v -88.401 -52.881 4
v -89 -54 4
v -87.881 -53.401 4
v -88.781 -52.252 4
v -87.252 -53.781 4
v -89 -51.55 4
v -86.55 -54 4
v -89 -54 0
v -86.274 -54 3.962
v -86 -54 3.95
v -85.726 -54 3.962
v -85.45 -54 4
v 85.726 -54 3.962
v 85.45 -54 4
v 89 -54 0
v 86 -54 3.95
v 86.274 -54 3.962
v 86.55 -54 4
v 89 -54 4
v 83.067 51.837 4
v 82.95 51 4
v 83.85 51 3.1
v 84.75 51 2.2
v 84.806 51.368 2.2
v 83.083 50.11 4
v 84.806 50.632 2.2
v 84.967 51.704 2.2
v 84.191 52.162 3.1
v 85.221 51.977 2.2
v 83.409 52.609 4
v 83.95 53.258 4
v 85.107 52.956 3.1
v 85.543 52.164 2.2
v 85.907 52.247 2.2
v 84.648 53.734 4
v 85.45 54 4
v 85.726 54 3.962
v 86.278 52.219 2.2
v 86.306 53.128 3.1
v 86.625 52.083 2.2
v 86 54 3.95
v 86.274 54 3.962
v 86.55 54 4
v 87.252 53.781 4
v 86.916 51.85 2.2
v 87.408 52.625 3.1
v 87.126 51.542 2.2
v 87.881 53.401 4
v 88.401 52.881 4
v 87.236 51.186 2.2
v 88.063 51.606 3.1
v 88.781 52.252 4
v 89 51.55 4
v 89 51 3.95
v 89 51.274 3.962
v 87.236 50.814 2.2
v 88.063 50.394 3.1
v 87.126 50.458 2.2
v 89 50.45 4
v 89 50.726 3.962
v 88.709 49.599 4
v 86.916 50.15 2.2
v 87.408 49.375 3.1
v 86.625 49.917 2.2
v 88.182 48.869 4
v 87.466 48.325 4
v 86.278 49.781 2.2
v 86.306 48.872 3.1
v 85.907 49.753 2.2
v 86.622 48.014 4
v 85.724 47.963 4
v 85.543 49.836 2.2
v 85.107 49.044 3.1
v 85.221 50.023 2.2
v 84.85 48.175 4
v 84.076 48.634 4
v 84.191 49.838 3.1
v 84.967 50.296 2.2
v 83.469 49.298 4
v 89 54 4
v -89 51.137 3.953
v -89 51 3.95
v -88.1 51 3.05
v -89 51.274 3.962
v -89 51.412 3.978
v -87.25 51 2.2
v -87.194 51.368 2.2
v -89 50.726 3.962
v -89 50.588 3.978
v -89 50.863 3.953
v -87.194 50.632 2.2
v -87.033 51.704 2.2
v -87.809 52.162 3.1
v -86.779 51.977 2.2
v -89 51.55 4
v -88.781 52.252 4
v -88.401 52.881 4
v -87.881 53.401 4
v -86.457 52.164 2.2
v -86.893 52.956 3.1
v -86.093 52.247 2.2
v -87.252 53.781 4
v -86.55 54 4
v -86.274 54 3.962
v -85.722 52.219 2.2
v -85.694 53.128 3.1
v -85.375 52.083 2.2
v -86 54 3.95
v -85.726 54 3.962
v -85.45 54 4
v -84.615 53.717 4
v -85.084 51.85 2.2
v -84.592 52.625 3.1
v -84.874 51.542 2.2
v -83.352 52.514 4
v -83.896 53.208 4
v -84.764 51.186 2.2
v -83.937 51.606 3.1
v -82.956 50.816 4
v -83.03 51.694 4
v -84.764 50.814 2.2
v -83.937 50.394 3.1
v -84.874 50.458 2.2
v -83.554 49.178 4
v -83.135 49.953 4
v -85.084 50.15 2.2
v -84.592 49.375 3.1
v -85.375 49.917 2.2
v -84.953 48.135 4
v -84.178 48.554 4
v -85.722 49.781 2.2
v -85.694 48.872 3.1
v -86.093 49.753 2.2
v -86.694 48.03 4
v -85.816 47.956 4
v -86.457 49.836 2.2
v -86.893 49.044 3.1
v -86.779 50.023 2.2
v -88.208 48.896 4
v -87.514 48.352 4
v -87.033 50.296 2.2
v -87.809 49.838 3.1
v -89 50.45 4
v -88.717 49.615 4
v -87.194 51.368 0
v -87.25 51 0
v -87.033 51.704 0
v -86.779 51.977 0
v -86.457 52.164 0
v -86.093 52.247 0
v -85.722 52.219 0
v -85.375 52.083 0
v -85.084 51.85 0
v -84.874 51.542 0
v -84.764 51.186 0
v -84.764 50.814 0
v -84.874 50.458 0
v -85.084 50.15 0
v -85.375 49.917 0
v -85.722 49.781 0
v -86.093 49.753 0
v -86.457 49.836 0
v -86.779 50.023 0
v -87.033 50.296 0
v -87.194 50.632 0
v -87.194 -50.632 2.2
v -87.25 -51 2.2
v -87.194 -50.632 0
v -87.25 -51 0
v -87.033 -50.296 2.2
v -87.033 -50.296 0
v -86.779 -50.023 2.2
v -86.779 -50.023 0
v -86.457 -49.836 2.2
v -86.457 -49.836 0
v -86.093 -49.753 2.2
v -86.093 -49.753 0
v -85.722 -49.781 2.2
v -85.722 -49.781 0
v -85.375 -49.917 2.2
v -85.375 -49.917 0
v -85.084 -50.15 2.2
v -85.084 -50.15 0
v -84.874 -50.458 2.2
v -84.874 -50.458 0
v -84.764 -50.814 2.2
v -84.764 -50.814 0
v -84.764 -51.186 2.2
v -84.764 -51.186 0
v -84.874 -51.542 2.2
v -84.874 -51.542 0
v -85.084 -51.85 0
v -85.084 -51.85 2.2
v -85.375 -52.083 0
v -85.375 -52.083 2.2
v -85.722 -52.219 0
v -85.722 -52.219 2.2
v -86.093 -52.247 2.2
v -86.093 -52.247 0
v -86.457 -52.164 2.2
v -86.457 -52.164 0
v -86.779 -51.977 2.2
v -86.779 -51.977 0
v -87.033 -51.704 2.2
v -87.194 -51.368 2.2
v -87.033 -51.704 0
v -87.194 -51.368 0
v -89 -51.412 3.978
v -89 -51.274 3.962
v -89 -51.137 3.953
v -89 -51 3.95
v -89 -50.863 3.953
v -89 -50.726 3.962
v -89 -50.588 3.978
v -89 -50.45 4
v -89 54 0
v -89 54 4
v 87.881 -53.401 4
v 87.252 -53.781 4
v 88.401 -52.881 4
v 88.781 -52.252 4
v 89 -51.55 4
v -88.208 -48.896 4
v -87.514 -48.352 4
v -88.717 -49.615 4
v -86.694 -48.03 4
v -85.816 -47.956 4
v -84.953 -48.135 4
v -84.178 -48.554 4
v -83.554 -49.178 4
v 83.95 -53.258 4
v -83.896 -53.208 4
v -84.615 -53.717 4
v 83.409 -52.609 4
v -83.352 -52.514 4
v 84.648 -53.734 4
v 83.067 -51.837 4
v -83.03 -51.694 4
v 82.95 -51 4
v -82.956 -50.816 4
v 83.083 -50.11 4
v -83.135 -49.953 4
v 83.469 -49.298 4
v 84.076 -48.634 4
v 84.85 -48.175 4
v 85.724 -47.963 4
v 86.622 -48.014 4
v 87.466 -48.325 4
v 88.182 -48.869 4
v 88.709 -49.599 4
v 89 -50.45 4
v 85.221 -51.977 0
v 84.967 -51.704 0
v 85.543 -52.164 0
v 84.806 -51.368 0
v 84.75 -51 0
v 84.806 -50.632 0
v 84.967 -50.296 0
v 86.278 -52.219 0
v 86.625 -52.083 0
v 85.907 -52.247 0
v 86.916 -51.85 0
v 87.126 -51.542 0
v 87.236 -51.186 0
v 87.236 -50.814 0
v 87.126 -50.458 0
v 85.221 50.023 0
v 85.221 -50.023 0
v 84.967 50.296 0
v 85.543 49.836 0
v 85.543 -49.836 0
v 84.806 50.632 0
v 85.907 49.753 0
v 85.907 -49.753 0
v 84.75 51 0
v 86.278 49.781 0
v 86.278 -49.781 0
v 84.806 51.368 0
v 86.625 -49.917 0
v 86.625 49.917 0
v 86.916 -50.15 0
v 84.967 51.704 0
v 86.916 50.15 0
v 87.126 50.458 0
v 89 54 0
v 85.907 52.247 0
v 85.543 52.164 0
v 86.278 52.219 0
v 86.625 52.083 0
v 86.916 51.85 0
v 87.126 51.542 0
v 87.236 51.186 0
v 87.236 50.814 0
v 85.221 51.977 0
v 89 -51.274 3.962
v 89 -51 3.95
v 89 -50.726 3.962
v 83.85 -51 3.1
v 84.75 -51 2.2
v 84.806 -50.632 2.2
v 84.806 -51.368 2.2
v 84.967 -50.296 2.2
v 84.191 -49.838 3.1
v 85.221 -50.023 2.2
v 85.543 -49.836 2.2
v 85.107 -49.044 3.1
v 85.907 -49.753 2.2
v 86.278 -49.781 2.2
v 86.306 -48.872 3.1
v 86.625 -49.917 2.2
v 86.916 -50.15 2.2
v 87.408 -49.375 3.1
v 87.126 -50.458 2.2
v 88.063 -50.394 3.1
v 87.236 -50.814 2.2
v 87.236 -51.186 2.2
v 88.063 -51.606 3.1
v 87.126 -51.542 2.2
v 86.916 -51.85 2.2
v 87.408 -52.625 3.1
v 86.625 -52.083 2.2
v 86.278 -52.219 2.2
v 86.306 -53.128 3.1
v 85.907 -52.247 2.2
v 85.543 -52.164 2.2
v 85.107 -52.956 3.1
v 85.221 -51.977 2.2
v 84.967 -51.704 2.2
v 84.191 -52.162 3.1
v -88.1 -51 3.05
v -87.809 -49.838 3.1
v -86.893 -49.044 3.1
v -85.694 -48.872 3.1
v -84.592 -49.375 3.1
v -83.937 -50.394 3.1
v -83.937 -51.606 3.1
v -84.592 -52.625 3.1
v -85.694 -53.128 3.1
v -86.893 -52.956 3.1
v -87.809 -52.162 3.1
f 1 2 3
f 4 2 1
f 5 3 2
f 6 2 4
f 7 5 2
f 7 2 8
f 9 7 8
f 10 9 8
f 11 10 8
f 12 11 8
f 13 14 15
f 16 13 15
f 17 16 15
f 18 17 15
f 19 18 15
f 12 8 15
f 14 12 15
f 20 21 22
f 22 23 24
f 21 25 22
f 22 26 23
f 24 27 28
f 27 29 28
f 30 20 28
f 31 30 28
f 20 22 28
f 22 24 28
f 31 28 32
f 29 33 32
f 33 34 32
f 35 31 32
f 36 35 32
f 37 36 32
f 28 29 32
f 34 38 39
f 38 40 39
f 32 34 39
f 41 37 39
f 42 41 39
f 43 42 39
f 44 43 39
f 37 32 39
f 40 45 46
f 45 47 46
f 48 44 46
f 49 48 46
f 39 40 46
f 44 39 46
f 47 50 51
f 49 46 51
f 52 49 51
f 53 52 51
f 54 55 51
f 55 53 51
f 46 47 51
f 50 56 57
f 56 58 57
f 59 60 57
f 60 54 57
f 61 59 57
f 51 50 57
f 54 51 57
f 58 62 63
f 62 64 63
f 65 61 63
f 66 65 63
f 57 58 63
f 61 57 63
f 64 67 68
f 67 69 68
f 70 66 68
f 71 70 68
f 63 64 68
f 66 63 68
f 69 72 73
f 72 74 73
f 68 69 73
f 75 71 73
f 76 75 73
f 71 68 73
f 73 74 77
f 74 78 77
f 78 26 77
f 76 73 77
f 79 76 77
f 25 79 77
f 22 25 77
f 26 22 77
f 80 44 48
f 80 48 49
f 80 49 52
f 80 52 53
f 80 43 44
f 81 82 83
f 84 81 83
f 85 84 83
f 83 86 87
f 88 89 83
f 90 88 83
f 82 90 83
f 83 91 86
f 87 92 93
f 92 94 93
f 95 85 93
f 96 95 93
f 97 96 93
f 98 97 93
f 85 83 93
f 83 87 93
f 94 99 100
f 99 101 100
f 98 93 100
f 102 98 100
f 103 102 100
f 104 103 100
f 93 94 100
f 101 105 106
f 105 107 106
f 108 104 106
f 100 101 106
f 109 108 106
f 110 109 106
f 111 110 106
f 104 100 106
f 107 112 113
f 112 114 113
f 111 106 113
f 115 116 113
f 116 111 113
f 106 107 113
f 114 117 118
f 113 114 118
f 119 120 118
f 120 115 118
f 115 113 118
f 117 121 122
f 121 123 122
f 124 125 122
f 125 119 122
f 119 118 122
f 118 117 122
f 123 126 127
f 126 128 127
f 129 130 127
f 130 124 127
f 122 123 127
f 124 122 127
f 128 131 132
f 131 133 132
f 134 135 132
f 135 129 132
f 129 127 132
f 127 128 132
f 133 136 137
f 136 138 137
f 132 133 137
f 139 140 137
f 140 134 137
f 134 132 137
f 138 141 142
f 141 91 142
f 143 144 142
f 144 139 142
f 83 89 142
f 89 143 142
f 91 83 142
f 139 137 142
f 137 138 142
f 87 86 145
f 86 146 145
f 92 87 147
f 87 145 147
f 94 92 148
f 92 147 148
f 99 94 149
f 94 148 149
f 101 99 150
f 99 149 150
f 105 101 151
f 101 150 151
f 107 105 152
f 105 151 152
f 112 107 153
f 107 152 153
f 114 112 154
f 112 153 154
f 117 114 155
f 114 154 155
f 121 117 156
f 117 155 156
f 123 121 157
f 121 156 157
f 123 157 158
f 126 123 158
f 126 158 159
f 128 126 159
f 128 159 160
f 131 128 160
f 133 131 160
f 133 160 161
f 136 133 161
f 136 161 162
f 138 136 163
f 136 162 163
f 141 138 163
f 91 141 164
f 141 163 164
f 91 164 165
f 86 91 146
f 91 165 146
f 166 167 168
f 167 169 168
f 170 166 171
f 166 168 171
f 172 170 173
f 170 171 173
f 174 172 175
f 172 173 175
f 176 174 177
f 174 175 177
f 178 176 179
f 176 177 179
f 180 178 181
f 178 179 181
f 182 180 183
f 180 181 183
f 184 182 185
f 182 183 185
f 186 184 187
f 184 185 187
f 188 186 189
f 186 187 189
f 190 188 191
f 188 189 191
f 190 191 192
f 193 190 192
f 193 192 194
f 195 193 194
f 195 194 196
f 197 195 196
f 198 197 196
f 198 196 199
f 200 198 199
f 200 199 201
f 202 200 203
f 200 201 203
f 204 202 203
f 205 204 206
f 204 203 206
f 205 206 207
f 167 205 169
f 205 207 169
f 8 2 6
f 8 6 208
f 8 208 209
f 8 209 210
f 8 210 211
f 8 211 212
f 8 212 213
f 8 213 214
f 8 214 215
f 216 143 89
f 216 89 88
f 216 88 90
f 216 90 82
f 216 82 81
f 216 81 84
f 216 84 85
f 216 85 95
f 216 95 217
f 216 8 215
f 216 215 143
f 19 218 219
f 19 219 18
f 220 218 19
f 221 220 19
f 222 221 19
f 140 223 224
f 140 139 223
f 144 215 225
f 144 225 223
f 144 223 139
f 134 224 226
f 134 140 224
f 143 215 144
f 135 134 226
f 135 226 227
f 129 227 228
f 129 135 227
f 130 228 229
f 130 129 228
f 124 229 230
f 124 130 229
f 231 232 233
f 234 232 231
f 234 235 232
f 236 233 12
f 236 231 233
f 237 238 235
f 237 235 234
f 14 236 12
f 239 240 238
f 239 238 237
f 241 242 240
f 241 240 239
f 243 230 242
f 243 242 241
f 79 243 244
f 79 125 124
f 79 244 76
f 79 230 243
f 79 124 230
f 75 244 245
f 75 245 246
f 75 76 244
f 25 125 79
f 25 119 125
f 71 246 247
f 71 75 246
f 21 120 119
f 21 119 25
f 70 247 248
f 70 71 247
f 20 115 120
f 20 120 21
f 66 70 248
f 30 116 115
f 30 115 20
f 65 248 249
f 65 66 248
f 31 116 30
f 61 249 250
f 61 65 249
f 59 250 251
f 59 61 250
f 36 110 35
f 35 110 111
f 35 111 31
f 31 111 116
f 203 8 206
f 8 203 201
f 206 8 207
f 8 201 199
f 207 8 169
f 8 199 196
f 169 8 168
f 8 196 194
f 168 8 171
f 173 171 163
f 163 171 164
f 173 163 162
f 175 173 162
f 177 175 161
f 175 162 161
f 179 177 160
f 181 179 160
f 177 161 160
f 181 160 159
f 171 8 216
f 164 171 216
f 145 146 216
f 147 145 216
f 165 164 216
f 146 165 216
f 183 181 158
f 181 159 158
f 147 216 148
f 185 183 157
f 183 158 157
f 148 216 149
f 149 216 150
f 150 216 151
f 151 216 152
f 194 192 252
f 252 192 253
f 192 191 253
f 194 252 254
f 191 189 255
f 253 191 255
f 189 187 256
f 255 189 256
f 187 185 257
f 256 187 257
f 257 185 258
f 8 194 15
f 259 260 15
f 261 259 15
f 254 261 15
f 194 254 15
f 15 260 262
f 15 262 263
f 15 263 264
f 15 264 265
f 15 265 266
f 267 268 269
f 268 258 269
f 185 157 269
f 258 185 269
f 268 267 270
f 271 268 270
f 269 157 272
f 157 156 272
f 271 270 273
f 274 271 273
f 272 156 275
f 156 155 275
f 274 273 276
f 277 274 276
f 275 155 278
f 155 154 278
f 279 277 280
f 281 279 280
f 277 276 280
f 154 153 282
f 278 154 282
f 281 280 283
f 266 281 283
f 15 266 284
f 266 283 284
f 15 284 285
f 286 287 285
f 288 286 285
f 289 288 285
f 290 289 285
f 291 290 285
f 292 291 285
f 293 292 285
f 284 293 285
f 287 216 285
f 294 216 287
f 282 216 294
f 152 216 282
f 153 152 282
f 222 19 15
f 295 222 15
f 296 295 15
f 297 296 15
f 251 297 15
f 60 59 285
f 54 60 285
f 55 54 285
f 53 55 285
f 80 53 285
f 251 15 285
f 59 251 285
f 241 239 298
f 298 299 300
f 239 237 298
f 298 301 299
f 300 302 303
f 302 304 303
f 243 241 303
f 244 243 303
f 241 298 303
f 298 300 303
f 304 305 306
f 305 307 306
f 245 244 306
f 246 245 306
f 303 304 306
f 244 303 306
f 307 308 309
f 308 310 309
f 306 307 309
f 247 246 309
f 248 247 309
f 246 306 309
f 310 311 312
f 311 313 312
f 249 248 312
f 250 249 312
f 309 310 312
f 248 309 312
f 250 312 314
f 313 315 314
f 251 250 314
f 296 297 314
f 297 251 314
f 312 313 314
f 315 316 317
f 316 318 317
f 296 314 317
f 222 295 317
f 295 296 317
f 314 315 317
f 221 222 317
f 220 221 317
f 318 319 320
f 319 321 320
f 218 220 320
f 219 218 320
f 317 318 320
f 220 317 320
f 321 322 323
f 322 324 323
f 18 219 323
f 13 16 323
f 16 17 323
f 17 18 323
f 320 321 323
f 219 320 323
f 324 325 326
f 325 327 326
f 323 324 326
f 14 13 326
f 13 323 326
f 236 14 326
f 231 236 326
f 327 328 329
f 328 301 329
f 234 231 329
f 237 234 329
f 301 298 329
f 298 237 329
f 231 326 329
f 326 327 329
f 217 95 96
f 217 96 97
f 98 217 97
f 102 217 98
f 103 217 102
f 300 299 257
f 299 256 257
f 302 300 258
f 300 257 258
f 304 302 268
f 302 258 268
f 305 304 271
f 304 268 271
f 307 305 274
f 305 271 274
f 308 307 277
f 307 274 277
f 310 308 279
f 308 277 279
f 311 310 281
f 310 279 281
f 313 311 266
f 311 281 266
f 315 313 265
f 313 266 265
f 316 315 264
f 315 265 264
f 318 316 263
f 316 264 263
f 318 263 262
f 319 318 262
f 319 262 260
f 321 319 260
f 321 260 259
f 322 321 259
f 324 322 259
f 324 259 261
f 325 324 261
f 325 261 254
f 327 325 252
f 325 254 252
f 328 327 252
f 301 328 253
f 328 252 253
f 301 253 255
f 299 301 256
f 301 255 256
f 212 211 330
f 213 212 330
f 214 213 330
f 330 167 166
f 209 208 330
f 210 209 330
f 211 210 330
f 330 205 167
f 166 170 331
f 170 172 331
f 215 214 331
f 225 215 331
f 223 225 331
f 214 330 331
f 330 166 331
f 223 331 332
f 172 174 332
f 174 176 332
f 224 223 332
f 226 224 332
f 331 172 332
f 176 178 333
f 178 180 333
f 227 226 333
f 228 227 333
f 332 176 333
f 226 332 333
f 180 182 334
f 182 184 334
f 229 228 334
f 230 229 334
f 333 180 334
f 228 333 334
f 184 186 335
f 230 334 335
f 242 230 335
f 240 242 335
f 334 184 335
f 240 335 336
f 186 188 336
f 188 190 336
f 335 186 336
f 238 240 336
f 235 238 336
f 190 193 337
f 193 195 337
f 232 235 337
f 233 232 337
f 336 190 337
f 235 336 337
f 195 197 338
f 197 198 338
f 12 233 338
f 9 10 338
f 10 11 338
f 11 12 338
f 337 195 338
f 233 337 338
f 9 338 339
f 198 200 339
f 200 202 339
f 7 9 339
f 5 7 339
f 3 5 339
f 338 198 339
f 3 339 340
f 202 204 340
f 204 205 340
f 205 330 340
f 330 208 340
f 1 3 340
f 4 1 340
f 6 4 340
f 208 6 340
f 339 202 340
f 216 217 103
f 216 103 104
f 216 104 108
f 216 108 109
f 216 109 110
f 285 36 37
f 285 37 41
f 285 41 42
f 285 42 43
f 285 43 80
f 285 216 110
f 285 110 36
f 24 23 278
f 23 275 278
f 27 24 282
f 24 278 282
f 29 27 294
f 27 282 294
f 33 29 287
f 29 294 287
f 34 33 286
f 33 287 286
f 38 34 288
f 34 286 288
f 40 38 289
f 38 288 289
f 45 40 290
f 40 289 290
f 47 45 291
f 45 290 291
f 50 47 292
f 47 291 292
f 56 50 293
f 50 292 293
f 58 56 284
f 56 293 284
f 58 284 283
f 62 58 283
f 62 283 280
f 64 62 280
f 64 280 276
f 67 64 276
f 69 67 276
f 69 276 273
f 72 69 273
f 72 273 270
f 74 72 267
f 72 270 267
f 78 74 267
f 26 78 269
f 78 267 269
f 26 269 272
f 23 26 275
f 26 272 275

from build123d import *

# Parameters (mm, degrees)
SKETCH_W         = 178
SKETCH_H         = 108
PAD_DEPTH        = 4
HOLE_D           = 2.5
HOLE_DEPTH       = 25
HOLE_CSINK_D     = 6.1
HOLE_CSINK_ANGLE = 90


with BuildPart() as part:
    # Sketch → Pad (new body)
    with BuildSketch(Plane.XY):
        Rectangle(SKETCH_W, SKETCH_H)
    extrude(amount=PAD_DEPTH)

    # Hole
    with Locations(Plane.XY.offset(4)):
        with Locations((-86, 51), (86, 51), (86, -51), (-86, -51)):
            CounterSinkHole(HOLE_D / 2, HOLE_CSINK_D / 2, depth=HOLE_DEPTH, counter_sink_angle=HOLE_CSINK_ANGLE)


solid = part.part
